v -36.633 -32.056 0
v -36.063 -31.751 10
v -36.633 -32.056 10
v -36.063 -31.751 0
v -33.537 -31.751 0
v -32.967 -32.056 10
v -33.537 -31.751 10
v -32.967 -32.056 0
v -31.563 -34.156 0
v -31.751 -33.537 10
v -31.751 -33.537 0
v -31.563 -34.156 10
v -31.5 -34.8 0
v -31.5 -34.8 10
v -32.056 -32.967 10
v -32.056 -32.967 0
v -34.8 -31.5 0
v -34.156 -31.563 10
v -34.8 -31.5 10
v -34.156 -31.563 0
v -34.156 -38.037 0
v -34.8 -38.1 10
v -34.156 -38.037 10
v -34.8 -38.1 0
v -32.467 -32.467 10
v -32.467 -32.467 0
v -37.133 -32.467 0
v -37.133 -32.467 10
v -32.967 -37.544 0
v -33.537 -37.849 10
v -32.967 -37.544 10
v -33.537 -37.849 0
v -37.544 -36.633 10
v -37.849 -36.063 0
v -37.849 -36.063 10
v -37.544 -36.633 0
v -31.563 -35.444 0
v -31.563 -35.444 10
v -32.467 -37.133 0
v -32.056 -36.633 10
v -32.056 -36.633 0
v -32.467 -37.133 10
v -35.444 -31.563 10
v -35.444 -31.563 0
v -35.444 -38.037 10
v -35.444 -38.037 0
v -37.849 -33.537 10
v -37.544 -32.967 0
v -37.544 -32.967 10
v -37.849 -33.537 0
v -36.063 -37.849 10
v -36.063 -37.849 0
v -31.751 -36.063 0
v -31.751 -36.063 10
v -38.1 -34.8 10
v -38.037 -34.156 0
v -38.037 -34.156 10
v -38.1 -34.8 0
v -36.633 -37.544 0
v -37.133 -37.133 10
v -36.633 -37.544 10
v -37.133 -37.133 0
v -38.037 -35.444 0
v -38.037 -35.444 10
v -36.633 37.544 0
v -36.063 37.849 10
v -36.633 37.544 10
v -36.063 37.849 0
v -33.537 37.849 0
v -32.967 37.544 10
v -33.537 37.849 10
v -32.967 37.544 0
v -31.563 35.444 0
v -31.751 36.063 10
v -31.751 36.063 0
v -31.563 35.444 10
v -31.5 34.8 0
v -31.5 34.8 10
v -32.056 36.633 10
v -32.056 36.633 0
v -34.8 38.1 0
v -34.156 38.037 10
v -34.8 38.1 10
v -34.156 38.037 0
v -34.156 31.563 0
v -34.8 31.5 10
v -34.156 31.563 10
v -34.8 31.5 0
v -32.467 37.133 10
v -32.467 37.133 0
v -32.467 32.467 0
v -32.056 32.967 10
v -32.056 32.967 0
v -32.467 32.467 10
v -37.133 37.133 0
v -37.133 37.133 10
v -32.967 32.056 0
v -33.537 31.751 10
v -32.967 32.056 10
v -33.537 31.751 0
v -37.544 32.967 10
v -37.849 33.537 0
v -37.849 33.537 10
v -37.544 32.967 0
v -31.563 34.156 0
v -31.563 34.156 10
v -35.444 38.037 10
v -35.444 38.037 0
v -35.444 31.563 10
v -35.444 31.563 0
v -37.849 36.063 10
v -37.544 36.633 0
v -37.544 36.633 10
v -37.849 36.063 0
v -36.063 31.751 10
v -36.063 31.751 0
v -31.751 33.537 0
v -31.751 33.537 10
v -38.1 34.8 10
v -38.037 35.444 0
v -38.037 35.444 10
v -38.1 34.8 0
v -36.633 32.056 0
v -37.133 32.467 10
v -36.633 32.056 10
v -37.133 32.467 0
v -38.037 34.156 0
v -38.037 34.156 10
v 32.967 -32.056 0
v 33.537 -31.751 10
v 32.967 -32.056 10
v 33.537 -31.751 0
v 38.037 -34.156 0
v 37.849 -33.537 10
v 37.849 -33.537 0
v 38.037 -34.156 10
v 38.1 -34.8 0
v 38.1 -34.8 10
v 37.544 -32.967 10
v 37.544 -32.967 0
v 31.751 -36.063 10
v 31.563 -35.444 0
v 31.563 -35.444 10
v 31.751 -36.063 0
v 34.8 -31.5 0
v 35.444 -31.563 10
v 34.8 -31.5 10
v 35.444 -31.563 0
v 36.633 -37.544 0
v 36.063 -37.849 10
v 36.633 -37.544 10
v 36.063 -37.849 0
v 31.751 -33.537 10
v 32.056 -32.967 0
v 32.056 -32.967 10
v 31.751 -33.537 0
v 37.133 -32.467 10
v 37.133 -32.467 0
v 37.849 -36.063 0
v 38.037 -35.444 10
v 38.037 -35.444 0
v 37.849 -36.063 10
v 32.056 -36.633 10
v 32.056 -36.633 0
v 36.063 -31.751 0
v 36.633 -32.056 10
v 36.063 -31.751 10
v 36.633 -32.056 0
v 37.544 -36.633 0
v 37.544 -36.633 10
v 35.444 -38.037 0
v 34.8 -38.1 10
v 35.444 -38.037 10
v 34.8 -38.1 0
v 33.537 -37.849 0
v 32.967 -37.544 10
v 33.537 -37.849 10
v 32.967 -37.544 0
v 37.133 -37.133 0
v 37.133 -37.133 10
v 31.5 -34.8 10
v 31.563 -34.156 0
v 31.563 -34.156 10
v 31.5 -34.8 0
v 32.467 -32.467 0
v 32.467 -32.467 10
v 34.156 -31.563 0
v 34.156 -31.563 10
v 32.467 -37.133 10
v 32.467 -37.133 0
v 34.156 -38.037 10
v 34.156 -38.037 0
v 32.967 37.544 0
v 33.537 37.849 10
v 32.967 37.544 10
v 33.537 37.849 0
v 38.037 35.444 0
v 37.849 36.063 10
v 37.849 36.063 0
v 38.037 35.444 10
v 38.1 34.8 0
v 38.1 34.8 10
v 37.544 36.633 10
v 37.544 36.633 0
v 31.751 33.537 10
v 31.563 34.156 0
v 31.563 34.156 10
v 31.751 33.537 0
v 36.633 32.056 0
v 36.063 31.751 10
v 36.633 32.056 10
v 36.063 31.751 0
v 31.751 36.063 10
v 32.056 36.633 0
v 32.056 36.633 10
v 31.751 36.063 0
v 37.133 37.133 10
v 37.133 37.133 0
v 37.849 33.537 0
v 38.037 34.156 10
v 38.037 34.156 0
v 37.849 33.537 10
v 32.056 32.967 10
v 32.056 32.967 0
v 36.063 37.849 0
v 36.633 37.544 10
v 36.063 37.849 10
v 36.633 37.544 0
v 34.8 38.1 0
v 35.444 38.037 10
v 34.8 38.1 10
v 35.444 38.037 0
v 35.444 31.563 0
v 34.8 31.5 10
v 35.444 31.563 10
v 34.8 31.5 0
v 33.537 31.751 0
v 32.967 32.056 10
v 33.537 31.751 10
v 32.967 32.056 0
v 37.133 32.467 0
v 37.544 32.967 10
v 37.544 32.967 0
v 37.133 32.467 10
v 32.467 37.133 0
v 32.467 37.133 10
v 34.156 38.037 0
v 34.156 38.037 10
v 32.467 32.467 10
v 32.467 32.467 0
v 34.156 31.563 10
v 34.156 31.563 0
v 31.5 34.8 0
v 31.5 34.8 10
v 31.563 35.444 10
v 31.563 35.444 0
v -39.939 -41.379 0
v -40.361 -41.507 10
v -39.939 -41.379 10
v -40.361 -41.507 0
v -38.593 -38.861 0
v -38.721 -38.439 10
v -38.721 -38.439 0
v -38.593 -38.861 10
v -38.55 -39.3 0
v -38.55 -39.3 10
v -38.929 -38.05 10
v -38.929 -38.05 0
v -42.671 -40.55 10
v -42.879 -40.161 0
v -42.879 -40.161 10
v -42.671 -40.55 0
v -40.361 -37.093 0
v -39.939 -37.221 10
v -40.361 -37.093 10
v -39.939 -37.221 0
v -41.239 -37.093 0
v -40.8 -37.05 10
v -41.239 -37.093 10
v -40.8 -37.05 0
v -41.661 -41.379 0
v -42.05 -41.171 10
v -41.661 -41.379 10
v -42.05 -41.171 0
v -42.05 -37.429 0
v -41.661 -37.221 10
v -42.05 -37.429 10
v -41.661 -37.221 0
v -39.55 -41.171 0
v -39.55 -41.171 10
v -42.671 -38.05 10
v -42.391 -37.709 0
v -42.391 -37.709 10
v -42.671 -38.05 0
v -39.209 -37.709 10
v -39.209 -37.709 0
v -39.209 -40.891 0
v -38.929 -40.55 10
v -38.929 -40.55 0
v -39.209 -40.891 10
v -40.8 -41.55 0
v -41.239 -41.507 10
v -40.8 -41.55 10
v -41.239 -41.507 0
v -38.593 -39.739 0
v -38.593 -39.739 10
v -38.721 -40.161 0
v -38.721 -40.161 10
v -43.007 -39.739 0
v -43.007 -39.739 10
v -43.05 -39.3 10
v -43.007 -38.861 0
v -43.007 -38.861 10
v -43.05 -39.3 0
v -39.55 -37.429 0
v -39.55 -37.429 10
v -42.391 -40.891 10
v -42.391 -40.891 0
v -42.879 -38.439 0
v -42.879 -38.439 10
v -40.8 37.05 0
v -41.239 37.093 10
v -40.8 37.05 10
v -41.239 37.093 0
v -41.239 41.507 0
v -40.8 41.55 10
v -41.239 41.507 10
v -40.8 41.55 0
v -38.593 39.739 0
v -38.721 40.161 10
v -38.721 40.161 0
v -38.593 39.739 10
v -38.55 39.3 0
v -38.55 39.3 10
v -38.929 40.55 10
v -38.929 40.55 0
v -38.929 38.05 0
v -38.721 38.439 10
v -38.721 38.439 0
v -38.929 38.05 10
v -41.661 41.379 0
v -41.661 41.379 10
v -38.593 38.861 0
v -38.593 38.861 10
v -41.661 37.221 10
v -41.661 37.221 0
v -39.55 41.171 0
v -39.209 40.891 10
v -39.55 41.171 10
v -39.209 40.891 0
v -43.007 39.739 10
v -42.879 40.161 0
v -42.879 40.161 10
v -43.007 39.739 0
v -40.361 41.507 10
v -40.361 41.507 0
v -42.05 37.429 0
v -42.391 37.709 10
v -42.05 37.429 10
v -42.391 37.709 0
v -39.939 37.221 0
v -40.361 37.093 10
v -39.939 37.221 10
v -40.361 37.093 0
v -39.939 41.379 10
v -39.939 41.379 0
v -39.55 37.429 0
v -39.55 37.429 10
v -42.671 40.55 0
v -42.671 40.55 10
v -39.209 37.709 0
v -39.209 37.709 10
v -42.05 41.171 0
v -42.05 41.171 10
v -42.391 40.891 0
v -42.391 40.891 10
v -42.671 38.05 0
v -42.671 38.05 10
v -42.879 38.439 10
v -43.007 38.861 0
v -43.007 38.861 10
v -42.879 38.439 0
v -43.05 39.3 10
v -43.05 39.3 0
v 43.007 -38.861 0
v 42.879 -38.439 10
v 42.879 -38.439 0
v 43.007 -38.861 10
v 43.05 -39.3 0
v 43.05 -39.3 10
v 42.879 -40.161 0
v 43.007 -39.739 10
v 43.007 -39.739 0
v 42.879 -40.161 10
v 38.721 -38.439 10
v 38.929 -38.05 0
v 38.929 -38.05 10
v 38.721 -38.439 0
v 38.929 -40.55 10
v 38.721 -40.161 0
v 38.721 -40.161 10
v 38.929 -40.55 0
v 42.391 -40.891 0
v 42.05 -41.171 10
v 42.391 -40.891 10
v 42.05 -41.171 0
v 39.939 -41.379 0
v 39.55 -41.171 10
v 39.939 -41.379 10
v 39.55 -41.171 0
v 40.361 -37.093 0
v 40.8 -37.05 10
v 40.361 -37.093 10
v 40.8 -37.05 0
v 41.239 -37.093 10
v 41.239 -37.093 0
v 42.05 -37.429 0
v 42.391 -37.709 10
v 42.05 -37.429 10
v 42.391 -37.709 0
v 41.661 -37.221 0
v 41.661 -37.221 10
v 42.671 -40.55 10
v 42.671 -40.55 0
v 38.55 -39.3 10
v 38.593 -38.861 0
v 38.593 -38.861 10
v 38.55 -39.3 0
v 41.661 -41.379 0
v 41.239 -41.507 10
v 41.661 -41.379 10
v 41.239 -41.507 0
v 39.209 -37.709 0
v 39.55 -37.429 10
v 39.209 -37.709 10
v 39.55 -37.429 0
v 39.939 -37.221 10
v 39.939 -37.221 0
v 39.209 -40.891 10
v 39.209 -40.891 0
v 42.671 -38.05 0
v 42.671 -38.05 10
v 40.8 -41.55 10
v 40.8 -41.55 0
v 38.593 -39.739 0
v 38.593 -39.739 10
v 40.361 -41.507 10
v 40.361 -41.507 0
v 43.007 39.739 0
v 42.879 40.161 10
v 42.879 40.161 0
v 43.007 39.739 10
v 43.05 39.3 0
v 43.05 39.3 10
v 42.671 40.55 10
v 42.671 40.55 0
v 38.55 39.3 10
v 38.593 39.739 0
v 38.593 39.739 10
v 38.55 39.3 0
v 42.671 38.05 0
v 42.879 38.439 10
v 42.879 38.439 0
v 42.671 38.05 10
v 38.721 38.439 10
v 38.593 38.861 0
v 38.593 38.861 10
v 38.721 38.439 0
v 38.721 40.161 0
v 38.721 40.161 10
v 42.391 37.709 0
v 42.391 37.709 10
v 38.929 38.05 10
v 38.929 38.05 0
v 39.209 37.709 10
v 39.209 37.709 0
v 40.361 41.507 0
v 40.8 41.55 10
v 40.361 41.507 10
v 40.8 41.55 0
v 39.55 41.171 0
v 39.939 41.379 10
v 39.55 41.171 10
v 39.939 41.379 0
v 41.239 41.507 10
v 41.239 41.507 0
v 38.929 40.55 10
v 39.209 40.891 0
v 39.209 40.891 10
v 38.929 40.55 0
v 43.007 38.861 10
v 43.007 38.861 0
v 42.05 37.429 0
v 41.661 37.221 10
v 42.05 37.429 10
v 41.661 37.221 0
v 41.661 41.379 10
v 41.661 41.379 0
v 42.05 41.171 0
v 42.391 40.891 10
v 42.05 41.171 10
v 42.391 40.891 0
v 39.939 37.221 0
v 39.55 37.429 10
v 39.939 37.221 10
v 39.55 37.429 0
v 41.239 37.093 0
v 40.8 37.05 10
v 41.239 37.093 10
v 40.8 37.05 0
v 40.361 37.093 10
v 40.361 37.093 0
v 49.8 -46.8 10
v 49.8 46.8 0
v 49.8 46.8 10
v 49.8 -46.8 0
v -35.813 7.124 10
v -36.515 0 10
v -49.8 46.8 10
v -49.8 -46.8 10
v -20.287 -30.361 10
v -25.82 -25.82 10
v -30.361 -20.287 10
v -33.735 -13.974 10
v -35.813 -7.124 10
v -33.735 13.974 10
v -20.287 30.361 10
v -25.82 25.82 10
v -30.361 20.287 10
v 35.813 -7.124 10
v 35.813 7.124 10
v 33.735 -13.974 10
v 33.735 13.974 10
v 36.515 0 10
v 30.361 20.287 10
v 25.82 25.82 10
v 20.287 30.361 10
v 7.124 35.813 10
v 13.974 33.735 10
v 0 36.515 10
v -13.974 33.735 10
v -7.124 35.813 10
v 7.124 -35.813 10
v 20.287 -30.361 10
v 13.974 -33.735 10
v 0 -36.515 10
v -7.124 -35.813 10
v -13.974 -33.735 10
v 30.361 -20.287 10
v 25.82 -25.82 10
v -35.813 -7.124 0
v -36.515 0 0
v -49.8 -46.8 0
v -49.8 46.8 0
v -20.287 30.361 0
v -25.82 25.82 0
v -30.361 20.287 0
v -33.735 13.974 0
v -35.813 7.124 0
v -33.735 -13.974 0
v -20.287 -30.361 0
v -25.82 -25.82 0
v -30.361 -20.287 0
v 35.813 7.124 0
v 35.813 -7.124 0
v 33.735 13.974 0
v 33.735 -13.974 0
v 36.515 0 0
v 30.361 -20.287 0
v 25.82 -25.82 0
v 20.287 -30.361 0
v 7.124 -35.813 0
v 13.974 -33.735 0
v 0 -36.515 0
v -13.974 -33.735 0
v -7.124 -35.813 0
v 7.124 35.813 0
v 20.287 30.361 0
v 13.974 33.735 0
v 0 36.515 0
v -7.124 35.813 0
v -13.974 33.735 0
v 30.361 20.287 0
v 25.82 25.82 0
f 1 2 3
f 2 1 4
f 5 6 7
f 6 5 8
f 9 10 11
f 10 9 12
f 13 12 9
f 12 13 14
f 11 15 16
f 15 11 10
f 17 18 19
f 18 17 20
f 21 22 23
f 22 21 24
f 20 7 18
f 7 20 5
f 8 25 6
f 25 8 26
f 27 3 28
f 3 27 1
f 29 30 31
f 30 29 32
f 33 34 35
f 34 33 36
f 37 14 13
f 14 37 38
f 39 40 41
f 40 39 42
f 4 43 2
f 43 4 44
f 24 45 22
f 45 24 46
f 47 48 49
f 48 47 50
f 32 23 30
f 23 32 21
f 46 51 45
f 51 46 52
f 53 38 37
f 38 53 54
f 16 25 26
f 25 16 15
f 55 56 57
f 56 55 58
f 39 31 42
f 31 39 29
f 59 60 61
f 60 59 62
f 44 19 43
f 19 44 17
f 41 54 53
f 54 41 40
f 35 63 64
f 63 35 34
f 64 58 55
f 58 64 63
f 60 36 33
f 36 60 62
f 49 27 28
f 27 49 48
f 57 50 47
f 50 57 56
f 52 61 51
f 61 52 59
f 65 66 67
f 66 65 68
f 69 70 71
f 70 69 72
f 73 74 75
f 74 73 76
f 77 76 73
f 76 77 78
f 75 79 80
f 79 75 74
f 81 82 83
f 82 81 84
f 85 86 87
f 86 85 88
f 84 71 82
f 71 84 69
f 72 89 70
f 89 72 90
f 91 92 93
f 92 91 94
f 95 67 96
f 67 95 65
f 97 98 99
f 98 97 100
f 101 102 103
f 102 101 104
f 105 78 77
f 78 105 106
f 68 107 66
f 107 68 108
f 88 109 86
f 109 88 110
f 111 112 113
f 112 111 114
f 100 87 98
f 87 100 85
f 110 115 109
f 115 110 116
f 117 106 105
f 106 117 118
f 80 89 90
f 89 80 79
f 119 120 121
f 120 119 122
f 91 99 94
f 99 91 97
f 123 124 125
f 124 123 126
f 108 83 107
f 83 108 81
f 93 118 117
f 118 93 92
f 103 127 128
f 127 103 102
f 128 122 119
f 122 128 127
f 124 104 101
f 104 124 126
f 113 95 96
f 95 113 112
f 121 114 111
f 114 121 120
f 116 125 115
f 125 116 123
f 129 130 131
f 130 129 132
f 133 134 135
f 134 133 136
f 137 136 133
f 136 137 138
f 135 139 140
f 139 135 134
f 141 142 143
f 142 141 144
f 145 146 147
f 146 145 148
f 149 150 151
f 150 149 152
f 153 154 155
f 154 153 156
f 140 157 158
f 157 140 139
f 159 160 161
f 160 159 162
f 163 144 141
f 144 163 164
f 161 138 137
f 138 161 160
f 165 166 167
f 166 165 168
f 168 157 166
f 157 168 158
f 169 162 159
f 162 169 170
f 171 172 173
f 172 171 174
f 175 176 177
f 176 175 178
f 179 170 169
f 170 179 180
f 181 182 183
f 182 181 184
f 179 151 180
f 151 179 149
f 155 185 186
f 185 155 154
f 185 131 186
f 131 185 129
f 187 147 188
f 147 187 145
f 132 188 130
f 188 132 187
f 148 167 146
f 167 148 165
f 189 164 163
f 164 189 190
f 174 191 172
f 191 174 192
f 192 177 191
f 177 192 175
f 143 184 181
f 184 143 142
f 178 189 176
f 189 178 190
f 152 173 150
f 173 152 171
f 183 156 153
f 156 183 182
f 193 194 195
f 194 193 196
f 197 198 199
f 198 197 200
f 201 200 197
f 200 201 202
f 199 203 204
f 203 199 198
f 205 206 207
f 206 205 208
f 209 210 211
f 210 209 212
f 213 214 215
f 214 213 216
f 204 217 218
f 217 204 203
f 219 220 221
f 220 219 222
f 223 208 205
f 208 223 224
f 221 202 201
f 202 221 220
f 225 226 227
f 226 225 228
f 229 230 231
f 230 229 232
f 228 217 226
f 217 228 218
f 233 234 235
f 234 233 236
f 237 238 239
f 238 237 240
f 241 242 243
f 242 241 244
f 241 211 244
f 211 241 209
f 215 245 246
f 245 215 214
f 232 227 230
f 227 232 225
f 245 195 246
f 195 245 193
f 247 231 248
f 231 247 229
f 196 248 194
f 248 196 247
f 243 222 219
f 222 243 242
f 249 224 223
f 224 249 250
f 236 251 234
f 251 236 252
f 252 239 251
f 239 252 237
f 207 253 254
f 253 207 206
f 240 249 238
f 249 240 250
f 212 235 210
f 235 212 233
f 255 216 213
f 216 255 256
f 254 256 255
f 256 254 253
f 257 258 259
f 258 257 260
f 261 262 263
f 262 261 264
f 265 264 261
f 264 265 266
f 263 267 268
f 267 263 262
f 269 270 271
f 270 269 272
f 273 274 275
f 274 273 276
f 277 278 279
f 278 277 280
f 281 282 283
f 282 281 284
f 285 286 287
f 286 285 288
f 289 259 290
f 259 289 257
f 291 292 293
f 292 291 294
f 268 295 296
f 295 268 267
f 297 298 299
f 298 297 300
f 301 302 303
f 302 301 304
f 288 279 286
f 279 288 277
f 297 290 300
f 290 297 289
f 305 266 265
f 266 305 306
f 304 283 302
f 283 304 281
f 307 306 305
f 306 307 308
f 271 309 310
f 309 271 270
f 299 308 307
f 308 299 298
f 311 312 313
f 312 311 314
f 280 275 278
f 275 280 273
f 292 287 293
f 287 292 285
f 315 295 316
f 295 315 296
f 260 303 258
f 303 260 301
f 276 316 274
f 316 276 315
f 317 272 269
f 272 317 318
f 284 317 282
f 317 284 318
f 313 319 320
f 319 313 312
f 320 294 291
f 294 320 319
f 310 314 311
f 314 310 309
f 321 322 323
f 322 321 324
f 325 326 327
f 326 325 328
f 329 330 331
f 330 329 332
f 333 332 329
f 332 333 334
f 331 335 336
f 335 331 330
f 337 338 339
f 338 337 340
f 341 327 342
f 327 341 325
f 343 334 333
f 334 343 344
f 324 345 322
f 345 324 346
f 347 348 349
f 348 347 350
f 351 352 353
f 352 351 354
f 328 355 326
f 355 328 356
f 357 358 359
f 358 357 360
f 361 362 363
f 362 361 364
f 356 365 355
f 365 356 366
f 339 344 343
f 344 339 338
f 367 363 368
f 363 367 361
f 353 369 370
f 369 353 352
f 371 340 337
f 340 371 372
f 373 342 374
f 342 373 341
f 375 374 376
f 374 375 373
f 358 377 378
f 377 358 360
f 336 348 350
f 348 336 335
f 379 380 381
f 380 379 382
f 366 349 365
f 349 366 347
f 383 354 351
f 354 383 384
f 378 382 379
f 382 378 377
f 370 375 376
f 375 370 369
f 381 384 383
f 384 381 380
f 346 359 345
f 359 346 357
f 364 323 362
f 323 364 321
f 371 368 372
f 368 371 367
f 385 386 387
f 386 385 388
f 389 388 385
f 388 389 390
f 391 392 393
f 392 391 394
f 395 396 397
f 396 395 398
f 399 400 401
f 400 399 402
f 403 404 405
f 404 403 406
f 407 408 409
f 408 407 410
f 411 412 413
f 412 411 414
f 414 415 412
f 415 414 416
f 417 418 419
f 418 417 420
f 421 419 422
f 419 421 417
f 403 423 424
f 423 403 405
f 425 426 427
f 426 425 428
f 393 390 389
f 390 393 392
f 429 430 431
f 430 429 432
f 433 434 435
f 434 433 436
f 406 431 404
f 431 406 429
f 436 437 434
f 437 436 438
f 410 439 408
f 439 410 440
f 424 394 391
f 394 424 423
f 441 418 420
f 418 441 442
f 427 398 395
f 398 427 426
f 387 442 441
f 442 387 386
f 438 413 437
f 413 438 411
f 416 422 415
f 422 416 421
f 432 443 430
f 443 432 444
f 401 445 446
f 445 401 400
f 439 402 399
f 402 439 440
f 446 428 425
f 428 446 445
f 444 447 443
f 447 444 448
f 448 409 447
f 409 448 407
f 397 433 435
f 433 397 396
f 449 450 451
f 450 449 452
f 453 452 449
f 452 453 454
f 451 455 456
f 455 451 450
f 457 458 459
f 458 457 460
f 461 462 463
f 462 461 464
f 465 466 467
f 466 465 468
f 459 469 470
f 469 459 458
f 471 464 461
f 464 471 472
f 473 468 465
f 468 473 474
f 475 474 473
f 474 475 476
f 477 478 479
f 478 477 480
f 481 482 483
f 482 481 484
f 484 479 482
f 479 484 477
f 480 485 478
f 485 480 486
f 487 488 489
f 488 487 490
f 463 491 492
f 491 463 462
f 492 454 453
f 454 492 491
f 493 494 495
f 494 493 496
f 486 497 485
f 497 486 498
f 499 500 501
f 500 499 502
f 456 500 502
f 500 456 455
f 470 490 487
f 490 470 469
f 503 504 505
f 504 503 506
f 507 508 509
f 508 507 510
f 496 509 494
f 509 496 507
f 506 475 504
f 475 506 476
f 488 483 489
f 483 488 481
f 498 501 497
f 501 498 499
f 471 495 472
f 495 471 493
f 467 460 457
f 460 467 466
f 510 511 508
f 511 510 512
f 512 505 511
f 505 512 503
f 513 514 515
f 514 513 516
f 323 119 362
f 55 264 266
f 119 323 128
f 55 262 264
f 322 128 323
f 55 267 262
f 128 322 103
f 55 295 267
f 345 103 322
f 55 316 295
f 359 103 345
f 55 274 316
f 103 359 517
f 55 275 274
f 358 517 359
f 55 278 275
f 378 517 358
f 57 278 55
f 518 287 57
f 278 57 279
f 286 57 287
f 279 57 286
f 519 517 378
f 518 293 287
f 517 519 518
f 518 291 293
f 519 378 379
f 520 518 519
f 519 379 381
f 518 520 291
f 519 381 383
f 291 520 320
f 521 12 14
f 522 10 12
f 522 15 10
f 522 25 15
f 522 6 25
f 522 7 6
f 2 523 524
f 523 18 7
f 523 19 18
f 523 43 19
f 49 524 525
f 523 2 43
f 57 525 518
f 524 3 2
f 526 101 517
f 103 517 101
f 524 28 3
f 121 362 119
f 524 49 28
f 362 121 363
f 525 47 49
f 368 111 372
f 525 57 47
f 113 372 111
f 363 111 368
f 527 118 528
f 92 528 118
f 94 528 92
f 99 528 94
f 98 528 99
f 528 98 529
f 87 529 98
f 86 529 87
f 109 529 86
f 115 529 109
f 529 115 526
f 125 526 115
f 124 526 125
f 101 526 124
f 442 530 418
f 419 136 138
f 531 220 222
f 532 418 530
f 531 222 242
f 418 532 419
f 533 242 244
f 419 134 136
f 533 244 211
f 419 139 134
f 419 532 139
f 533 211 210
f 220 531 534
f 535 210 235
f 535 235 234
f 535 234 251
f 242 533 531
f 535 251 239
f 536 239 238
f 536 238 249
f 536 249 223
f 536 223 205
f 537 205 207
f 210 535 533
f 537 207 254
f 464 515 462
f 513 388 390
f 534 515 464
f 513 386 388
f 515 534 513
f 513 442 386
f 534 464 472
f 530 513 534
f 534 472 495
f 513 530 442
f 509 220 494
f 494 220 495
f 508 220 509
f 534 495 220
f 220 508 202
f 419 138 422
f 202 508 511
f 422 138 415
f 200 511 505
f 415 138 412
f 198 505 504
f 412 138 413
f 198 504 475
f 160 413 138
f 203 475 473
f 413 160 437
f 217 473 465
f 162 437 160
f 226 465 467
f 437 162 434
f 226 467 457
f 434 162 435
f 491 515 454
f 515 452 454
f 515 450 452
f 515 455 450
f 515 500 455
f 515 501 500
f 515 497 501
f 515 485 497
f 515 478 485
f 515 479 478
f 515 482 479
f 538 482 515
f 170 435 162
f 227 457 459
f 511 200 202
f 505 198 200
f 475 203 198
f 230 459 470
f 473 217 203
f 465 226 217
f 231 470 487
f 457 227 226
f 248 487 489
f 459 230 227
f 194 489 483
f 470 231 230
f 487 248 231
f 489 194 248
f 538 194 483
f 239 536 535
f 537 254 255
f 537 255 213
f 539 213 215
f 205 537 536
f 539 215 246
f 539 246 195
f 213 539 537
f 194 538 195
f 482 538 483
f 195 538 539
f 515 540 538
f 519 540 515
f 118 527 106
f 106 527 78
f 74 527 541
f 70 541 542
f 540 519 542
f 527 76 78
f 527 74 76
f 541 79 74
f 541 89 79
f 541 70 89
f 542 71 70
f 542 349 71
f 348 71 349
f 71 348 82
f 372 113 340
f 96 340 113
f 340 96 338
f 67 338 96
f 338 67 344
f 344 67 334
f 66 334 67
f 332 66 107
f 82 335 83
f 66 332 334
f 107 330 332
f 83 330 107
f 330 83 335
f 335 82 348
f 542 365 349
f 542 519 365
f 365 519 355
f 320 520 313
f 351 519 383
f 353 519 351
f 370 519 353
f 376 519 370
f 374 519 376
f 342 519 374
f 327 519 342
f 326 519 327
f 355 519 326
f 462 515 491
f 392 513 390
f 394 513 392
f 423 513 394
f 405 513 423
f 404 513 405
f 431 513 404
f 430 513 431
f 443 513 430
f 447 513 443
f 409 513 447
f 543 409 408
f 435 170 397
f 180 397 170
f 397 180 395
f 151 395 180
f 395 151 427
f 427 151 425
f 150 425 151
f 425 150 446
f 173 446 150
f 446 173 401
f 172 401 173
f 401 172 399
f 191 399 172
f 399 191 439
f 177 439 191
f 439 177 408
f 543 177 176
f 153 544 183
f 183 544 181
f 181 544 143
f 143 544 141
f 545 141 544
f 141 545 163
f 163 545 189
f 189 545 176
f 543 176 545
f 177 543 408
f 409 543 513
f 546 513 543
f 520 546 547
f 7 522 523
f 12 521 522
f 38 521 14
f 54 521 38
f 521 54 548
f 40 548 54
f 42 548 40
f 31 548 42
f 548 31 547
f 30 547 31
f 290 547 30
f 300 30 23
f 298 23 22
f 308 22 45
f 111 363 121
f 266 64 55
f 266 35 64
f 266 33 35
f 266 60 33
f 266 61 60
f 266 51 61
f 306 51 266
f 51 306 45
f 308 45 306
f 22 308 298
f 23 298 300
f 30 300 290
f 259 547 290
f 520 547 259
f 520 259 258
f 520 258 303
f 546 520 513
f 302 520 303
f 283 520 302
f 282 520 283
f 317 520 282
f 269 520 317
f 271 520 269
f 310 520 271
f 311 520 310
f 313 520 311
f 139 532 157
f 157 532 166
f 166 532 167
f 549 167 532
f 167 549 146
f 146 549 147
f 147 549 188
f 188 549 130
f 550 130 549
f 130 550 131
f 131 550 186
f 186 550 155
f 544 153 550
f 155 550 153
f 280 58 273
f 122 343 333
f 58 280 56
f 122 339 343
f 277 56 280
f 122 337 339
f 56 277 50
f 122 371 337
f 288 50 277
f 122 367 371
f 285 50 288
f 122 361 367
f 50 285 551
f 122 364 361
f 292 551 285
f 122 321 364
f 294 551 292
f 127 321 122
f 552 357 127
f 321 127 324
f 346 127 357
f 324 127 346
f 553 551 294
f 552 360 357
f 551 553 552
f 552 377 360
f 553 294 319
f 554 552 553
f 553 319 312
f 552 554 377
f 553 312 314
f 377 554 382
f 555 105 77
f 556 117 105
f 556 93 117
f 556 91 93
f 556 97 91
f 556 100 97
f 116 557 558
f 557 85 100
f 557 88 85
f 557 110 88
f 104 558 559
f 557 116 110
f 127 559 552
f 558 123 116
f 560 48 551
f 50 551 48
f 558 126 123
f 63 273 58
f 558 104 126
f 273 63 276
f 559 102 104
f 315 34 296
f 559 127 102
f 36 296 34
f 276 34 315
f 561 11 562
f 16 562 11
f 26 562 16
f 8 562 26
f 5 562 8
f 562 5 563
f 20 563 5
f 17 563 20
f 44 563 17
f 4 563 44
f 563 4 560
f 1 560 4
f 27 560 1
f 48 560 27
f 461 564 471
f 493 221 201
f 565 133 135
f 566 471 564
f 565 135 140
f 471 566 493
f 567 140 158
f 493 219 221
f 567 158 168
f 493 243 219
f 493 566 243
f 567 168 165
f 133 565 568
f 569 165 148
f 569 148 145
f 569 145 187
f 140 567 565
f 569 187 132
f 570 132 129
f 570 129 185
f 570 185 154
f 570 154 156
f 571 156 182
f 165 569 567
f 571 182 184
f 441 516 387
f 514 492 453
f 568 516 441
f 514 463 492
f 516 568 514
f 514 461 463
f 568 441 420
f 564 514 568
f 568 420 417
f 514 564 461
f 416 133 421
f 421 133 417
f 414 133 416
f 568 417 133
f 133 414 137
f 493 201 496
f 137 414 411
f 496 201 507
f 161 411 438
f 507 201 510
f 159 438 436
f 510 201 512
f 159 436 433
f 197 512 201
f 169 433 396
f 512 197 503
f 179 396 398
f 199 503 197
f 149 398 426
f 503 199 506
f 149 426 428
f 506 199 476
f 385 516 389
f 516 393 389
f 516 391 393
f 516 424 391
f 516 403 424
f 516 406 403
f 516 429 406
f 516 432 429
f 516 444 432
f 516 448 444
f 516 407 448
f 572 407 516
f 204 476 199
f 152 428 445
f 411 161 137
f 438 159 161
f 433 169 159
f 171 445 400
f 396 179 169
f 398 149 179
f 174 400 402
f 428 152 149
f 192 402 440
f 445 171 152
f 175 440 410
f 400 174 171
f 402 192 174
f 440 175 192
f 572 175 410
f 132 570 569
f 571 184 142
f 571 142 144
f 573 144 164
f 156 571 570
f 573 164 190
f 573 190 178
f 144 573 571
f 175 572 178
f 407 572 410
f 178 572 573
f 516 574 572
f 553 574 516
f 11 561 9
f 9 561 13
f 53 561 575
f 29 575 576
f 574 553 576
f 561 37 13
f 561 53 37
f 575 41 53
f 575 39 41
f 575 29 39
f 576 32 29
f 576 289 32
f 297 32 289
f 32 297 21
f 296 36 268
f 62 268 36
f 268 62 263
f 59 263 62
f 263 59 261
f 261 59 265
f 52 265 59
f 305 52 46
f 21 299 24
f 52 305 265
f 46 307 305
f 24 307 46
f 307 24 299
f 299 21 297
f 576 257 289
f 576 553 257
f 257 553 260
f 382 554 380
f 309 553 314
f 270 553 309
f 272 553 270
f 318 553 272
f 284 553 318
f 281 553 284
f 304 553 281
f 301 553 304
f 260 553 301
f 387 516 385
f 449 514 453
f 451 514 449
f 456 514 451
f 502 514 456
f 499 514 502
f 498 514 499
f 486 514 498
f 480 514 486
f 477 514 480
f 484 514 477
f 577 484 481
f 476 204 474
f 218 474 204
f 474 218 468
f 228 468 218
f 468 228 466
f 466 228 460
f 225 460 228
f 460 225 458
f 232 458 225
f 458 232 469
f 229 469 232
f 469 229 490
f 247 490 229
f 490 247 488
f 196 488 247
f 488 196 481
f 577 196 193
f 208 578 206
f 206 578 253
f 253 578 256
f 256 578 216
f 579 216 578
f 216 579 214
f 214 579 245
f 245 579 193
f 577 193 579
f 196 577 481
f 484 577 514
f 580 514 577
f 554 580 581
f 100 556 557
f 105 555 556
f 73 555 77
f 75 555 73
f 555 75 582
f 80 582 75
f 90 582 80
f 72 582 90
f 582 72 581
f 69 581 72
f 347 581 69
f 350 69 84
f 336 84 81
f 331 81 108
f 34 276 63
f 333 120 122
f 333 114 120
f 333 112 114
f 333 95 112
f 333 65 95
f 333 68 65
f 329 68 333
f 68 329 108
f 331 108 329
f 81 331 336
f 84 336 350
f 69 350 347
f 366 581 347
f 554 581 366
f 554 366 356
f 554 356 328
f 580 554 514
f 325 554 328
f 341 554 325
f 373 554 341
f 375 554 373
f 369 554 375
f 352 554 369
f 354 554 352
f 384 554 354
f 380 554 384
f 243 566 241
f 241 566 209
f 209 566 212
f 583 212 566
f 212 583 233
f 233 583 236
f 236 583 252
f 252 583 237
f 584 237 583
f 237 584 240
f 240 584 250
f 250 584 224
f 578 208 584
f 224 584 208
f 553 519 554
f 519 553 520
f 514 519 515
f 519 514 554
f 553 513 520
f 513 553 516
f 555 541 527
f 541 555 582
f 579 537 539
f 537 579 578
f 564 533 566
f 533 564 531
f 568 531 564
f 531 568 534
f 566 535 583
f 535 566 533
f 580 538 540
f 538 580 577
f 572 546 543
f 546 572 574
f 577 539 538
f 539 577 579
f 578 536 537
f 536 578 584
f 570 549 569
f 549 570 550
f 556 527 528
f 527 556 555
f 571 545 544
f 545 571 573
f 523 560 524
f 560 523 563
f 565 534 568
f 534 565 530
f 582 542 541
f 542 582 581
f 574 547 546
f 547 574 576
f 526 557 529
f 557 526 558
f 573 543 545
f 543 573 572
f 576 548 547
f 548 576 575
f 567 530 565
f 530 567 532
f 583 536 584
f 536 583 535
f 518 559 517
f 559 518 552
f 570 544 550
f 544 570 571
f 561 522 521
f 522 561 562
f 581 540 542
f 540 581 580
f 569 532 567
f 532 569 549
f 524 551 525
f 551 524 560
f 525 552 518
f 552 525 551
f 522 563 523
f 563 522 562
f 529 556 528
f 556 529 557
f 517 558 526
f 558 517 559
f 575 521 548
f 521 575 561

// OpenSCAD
$fn = 32;

// ----------------------------------------------------------------------
// Motor mount plate: NEMA34, 99.6 x 93.6 x 10 mm
// ----------------------------------------------------------------------

// --- parameters (mm) ---
base_x = 99.6;            // plate length, X
base_y = 93.6;            // plate width, Y
thick = 10;               // plate thickness
bolt_pitch = 69.6;        // NEMA34 bolt spacing
motor_d = 6.6;            // NEMA34 screw clearance
boss_hole = 73.03;        // pilot boss bore
second_d = 4.5;           // second fastener hole

module plate() {
  translate([-base_x / 2, -base_y / 2, 0]) cube([base_x, base_y, thick]);
}

module motor_holes() {
  for (sx = [-1, 1]) for (sy = [-1, 1])
    translate([sx * bolt_pitch / 2, sy * bolt_pitch / 2, -1])
      cylinder(h = thick + 2, d = motor_d);
}

difference() {
  union() {
    plate();
  }
  motor_holes();
  translate([0, 0, -1]) cylinder(h = thick + 2, d = boss_hole);
  for (sx = [-1, 1]) for (sy = [-1, 1])
    translate([sx * 40.8, sy * 39.3, -1]) cylinder(h = thick + 2, d = second_d);
}
